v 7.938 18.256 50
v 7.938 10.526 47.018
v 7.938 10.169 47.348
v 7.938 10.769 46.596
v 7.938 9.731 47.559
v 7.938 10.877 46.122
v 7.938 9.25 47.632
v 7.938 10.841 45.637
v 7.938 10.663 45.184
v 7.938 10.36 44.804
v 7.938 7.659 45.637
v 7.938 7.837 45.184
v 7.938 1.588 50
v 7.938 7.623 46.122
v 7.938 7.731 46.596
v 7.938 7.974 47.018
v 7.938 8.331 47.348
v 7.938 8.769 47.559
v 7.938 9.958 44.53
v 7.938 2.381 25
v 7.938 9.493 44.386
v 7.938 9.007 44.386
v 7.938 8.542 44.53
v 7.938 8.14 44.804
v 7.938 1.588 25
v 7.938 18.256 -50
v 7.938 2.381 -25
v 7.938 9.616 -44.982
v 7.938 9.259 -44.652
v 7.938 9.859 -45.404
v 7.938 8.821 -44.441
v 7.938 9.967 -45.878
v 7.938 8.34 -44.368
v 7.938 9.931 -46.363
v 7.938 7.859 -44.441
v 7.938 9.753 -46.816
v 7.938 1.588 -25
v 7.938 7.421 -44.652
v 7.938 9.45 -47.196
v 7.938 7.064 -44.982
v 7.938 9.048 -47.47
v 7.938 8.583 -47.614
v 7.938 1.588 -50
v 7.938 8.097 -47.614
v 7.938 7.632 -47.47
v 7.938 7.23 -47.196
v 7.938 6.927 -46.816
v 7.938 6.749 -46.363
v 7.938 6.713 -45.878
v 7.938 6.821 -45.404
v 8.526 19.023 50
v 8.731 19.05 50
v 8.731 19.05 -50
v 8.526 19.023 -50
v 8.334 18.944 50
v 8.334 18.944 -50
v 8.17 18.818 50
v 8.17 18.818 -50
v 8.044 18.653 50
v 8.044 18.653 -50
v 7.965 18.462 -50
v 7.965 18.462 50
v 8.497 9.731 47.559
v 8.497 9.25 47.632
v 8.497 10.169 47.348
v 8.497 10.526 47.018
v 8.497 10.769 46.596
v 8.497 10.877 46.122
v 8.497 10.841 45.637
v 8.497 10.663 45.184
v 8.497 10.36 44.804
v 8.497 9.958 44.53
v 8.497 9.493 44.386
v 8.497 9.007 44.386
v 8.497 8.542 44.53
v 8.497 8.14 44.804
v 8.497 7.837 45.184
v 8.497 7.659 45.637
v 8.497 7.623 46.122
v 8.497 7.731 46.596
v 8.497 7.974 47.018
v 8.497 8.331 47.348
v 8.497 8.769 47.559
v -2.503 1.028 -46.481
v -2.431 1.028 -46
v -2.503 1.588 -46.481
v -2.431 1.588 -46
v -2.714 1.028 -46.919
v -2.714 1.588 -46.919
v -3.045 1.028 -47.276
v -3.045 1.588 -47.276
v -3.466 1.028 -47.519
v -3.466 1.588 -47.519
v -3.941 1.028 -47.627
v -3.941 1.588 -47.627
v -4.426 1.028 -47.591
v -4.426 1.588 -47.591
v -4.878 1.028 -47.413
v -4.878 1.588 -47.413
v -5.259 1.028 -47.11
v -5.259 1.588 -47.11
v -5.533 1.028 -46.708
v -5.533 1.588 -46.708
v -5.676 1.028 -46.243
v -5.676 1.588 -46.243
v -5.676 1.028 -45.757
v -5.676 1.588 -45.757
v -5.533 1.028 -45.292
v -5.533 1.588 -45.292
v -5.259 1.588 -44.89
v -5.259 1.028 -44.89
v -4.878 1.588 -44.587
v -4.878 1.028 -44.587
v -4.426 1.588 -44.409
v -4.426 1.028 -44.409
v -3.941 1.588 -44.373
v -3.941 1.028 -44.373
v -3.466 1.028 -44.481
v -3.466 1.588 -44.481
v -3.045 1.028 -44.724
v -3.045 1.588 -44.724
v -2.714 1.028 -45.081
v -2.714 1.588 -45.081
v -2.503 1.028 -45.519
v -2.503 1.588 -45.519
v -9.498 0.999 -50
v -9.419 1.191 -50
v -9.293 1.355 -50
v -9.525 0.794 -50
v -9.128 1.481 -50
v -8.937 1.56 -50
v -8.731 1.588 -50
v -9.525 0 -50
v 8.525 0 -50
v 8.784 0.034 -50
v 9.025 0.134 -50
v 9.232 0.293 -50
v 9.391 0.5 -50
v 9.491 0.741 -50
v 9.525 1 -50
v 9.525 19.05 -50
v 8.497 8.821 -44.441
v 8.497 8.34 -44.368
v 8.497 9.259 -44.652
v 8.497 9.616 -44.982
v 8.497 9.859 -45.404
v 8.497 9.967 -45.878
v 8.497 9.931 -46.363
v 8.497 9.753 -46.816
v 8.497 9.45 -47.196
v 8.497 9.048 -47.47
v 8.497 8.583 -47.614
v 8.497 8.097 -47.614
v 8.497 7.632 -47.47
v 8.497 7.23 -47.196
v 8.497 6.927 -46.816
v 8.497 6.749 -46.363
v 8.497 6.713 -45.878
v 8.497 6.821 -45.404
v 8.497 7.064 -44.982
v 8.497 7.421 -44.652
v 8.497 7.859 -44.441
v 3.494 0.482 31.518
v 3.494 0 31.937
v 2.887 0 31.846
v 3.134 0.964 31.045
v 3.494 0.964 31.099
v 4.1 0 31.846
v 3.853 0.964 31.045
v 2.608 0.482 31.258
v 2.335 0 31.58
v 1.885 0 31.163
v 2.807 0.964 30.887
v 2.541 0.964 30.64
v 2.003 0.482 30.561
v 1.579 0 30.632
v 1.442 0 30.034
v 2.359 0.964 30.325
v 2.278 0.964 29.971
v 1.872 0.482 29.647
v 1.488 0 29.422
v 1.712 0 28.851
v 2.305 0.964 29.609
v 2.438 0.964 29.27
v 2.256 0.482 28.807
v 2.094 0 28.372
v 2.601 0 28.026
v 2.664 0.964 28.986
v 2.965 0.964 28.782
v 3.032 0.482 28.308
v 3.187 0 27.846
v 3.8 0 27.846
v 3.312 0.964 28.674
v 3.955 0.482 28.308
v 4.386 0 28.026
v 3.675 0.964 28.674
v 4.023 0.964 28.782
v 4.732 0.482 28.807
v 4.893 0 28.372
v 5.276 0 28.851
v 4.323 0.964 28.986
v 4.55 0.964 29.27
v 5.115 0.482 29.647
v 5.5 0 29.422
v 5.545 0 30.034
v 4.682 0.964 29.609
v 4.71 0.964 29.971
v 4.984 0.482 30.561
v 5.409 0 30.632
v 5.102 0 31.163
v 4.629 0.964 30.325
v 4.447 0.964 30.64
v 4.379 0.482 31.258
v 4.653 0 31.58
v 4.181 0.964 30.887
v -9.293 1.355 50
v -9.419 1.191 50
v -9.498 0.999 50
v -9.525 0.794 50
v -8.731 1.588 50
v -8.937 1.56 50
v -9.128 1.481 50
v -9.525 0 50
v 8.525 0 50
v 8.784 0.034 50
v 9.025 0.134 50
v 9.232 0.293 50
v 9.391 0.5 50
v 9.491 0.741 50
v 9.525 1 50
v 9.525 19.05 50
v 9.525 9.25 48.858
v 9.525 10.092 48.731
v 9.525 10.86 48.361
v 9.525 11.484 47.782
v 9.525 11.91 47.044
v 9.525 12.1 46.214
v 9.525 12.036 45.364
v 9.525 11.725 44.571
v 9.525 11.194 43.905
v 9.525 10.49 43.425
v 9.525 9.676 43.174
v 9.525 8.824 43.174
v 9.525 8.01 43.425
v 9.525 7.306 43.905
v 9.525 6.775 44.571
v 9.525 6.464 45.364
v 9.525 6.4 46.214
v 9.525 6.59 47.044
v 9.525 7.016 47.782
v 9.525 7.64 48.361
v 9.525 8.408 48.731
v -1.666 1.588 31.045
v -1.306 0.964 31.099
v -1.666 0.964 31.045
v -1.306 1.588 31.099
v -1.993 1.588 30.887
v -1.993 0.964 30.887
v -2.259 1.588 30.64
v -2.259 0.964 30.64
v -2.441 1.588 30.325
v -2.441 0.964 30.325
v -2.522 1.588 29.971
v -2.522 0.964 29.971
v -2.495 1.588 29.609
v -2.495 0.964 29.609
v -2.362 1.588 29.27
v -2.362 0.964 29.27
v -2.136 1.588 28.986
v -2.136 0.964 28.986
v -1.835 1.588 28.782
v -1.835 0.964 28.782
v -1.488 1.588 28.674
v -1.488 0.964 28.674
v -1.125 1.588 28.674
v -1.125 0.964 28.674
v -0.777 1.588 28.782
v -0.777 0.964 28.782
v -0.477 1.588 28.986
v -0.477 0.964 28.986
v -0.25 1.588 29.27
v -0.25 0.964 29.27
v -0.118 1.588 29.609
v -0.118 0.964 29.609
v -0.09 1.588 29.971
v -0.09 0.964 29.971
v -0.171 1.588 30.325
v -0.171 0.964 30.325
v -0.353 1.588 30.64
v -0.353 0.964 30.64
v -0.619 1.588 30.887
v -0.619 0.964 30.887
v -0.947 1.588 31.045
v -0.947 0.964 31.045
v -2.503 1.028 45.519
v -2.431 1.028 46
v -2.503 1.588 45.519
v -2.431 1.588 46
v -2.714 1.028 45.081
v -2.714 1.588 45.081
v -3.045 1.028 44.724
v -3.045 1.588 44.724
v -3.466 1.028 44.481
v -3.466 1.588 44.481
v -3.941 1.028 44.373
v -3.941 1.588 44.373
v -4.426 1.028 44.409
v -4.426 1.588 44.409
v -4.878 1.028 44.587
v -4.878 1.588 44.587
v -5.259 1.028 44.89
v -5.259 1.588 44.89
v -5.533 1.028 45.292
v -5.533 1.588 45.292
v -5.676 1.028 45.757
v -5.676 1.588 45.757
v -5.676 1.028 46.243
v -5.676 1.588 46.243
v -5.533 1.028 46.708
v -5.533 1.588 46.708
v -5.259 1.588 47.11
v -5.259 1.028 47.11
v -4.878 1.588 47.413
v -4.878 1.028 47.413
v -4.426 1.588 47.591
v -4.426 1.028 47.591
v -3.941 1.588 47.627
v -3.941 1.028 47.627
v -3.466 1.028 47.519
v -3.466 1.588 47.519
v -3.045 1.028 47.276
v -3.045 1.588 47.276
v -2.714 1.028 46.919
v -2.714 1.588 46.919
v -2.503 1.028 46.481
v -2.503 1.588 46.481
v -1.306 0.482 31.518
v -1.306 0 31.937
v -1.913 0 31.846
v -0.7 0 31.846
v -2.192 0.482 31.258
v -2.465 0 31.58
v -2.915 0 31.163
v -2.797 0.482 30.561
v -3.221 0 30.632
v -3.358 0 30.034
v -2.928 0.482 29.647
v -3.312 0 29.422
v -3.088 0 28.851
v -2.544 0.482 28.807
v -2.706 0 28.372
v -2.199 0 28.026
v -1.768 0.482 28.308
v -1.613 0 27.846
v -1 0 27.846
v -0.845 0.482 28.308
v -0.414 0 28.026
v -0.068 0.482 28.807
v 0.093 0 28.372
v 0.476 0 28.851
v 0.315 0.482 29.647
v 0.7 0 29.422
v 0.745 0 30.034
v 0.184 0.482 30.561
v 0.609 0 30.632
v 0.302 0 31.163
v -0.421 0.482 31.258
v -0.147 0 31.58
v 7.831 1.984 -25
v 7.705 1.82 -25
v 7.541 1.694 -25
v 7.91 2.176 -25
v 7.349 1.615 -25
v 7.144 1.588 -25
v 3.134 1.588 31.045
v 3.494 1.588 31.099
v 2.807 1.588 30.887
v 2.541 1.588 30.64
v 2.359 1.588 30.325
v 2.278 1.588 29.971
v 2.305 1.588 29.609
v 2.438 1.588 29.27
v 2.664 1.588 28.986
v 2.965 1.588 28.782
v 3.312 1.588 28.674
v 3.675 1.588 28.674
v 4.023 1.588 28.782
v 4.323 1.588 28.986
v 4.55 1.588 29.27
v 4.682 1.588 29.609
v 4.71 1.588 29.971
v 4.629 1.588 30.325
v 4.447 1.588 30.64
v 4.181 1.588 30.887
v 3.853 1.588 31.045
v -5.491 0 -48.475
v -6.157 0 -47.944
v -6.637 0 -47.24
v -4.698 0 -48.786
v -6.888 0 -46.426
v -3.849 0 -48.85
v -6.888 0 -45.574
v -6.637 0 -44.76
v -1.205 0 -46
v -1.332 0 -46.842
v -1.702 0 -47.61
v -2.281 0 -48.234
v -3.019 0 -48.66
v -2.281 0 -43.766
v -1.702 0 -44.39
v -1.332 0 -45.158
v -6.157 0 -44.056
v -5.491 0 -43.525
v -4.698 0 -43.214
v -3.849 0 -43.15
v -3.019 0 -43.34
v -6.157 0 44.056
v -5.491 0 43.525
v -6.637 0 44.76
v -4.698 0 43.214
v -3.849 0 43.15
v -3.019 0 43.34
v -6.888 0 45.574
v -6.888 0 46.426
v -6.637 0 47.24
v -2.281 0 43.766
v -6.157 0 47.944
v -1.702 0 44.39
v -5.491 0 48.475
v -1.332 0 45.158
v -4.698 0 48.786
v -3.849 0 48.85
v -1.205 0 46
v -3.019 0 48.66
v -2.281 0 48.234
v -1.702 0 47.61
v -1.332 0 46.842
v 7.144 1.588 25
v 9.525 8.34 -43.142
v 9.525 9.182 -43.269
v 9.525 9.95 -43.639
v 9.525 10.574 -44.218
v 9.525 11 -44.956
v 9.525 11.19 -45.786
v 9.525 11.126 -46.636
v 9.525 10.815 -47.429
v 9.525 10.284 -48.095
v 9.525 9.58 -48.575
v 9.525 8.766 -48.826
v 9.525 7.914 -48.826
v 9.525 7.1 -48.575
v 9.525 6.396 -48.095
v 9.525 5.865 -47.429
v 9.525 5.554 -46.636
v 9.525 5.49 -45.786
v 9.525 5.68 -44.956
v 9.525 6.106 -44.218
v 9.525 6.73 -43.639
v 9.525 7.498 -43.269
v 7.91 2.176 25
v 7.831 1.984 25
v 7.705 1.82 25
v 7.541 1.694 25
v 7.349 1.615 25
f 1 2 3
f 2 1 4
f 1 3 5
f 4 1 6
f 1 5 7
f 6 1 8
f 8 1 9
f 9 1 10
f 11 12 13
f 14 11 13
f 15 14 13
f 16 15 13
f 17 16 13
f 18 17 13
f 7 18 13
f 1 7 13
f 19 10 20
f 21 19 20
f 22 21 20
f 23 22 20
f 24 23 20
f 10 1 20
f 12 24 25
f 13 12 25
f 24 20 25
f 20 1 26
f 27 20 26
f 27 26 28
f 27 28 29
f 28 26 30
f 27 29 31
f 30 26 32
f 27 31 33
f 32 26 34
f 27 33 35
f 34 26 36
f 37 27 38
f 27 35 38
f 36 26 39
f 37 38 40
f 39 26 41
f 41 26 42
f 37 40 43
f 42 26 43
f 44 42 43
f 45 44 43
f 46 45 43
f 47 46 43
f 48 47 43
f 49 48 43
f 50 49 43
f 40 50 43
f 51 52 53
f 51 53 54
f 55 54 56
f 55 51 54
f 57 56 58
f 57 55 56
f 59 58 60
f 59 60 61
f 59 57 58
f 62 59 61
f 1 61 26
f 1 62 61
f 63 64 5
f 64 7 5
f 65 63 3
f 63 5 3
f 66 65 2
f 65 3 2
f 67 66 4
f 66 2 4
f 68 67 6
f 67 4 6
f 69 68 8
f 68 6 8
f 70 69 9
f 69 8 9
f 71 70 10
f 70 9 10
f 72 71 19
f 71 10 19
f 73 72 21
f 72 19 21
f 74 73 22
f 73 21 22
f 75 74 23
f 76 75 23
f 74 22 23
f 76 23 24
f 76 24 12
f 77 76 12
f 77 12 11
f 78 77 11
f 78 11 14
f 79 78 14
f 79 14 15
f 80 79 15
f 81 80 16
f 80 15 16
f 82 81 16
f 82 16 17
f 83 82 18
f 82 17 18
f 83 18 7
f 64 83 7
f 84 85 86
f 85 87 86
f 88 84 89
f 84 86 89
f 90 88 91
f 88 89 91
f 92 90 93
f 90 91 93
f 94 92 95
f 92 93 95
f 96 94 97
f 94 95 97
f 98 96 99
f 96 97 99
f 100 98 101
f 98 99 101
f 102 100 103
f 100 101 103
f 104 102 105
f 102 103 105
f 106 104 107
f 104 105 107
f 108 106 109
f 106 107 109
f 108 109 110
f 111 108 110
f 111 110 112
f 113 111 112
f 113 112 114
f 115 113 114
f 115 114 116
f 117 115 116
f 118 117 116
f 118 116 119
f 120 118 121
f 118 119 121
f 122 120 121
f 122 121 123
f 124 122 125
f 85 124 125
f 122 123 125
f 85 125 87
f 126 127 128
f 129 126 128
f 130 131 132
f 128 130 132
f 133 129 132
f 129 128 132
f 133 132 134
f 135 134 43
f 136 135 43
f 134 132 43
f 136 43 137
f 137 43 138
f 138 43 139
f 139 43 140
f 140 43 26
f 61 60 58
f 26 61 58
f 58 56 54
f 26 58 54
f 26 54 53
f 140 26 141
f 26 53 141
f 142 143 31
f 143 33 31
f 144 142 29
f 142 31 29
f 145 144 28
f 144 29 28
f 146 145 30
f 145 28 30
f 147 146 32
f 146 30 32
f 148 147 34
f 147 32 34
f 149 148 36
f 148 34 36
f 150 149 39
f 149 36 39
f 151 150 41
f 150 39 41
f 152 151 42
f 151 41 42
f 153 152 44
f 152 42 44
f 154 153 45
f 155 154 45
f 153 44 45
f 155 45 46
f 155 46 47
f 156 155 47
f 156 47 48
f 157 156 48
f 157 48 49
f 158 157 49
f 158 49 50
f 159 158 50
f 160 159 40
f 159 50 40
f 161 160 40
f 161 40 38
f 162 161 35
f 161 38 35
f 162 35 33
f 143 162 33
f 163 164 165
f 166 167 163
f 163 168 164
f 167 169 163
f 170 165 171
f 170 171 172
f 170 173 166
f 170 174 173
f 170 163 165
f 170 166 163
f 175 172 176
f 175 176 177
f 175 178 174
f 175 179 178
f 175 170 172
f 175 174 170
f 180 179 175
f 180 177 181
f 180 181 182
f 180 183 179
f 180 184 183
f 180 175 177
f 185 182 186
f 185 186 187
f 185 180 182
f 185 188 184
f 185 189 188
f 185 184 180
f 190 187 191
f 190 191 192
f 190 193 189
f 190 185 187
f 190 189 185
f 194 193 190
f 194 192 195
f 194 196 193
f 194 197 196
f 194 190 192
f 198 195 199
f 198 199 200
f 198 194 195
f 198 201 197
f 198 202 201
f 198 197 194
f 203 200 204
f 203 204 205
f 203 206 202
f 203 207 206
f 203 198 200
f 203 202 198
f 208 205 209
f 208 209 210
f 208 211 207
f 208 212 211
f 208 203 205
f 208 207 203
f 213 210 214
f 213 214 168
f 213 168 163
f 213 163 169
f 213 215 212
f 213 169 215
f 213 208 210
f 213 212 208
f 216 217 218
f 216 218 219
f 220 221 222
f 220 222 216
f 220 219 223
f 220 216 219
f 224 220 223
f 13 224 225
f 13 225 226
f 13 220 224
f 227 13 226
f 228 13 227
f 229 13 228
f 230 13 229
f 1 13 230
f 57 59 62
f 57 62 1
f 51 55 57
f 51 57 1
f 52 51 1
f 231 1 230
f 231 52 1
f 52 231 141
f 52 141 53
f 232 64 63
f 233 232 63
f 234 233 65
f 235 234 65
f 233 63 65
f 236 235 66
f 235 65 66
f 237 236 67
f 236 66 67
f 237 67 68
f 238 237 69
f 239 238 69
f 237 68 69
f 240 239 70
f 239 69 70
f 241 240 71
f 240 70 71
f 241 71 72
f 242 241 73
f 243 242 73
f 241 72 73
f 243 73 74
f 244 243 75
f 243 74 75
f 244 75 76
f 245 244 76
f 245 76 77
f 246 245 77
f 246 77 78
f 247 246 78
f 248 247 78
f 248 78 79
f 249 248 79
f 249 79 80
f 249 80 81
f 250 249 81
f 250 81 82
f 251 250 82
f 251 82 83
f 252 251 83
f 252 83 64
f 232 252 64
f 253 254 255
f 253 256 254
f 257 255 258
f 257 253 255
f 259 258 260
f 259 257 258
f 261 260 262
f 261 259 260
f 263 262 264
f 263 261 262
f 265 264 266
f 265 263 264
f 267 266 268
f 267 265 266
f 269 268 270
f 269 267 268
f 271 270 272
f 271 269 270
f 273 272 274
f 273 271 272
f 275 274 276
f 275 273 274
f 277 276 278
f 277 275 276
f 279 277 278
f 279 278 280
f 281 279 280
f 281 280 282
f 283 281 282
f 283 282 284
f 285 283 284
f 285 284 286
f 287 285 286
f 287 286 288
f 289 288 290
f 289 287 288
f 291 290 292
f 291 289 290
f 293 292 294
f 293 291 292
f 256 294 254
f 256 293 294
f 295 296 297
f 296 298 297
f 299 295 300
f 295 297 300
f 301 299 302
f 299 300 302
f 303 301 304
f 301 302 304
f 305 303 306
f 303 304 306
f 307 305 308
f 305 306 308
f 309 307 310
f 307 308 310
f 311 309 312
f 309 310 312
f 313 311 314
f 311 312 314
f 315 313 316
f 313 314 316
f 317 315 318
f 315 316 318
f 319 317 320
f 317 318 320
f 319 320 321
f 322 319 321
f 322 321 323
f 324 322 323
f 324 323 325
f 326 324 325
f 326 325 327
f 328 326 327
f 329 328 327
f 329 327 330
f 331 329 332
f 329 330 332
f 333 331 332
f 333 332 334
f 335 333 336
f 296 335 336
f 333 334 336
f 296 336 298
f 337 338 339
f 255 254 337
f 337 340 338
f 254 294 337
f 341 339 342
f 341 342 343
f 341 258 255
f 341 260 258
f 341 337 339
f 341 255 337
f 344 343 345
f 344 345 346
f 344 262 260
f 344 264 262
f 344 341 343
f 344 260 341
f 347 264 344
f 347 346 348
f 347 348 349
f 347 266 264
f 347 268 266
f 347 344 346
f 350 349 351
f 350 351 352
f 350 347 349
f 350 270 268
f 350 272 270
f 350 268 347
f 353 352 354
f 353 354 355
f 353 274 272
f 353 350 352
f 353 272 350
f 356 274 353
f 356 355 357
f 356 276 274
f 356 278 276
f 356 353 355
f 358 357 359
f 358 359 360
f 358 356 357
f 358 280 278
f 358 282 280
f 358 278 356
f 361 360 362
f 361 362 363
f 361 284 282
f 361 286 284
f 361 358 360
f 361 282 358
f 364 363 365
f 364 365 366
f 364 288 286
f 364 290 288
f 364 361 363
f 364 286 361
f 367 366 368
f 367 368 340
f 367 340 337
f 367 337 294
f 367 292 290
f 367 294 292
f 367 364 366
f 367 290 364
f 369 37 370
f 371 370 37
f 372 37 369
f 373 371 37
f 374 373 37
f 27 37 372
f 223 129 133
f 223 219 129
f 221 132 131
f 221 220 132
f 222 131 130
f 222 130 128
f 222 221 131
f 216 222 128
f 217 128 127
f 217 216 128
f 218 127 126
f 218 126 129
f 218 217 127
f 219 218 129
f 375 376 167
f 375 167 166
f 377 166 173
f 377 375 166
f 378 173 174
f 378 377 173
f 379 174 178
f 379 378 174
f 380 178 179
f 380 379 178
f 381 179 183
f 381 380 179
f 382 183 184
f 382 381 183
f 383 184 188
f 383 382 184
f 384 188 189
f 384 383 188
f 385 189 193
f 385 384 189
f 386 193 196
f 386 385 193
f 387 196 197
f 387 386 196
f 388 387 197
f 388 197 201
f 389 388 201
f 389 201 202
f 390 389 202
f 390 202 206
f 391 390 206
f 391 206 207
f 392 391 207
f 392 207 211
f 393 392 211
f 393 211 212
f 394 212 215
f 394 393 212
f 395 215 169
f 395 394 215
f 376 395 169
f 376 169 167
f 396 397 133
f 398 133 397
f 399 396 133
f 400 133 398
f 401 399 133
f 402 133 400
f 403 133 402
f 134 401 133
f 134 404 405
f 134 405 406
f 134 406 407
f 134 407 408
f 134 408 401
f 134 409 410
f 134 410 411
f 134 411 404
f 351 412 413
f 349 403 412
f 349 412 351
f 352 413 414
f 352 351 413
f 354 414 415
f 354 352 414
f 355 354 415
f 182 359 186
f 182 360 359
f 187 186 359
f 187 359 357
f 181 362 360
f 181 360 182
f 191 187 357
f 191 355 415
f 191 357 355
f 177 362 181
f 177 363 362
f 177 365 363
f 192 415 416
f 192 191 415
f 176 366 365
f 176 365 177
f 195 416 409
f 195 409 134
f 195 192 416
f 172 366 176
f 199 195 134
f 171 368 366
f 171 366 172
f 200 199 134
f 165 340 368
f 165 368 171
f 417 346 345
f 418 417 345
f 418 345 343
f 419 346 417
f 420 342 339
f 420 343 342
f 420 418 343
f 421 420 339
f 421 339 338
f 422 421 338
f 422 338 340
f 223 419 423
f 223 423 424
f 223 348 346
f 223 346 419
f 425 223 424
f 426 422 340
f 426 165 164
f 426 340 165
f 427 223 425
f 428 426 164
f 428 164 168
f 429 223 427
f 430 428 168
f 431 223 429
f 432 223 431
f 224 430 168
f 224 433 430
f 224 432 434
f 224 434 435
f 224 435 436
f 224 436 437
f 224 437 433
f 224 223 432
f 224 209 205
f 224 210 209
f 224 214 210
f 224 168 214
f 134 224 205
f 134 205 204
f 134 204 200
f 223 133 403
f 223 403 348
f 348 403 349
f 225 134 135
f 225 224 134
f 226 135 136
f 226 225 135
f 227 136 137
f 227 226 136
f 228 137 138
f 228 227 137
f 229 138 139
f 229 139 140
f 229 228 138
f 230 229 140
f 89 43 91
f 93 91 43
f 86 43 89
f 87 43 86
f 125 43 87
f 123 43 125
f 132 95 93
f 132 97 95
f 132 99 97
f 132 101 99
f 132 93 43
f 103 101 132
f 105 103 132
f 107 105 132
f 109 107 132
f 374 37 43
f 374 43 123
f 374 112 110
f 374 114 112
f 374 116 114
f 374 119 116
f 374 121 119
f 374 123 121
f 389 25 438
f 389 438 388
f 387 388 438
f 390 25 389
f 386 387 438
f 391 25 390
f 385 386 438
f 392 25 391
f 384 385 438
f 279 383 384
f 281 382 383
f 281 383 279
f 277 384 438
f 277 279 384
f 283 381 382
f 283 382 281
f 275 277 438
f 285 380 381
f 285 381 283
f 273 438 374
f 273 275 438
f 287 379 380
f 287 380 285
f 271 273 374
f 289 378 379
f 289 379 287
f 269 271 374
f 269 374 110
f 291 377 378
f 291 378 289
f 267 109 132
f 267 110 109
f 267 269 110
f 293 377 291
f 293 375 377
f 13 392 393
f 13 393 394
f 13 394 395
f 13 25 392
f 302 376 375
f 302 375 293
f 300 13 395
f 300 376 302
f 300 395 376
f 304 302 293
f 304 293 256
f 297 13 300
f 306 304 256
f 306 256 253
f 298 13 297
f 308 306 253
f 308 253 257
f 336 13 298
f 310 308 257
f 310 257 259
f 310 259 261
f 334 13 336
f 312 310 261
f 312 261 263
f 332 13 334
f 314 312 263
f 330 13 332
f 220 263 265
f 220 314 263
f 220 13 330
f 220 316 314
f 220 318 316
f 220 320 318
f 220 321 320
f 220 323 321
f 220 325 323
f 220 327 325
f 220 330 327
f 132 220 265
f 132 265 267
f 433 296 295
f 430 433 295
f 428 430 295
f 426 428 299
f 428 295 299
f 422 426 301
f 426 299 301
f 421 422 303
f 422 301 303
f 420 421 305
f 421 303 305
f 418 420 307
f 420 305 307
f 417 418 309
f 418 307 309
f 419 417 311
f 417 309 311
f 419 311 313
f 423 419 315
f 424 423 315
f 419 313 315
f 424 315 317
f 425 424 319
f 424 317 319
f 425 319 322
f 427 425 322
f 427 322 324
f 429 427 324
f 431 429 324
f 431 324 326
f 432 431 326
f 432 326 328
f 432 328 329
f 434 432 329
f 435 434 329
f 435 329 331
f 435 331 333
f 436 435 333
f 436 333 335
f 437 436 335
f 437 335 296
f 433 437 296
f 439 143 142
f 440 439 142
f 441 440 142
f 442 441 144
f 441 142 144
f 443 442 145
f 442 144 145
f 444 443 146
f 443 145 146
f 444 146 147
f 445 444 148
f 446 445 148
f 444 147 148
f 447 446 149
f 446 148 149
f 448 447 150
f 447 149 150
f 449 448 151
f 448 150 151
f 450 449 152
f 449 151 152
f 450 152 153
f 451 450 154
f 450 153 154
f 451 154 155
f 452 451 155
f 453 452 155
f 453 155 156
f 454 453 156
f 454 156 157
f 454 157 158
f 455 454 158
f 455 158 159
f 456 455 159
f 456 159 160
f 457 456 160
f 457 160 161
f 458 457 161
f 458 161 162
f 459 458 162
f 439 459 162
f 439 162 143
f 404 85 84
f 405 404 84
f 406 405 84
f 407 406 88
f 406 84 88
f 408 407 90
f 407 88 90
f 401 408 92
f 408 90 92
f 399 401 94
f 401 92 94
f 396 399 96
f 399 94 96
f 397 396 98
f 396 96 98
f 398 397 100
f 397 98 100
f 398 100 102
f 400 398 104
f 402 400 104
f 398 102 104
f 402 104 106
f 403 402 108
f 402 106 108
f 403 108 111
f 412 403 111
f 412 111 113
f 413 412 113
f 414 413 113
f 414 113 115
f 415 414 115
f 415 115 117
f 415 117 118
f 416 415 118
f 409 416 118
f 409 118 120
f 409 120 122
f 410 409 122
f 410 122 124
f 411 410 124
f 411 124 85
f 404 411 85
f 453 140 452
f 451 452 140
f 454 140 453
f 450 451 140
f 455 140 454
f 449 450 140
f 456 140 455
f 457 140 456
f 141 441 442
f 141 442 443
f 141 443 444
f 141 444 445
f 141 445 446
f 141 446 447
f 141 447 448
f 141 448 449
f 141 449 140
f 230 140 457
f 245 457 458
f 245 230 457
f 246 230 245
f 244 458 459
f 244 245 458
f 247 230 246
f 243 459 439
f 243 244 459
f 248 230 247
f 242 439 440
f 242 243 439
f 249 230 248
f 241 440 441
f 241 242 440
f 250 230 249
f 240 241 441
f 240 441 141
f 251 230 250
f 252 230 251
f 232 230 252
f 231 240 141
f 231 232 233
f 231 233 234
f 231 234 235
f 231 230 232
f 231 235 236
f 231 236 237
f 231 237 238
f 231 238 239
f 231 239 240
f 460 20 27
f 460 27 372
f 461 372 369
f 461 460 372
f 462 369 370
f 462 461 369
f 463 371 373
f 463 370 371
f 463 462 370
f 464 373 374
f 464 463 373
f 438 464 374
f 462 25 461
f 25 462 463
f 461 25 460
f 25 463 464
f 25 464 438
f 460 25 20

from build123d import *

# Parameters (mm, degrees)
BOSS_EXTRUDE1_DEPTH                               = 50
CSK_FOR_4_FLAT_HEAD_MACHINE_SCREW_100_D           = 3.2639
CSK_FOR_4_FLAT_HEAD_MACHINE_SCREW_100_CSINK_D     = 5.715
CSK_FOR_4_FLAT_HEAD_MACHINE_SCREW_100_CSINK_ANGLE = 100
CSK_FOR_4_FLAT_HEAD_MACHINE_SCREW_2_D             = 3.2639
CSK_FOR_4_FLAT_HEAD_MACHINE_SCREW_2_CSINK_D       = 5.715
CSK_FOR_4_FLAT_HEAD_MACHINE_SCREW_2_CSINK_ANGLE   = 100
FILLET1_R                                         = 1
F_2_CLEARANCE_HOLE1_AT_2_COUNT                    = 2
F_2_CLEARANCE_HOLE1_AT_2_PITCH                    = 4.8
CUT_EXTRUDE1_DEPTH                                = 25


with BuildPart() as part:
    # Sketch2 → Boss-Extrude1 (new, symmetric)
    with BuildSketch(Plane.XY):
        with BuildLine():
            Line((-9.525, 0), (9.525, 0))
            Line((9.525, 0), (9.525, 19.05))
            Line((9.525, 19.05), (8.73125, 19.05))
            ThreePointArc((8.73125, 19.05), (8.169983992, 18.817516008), (7.9375, 18.25625))
            Line((7.9375, 18.25625), (7.9375, 2.38125))
            ThreePointArc((7.9375, 2.38125), (7.705016008, 1.819983992), (7.14375, 1.5875))
            Line((7.14375, 1.5875), (-8.73125, 1.5875))
            ThreePointArc((-8.73125, 1.5875), (-9.292516008, 1.355016008), (-9.525, 0.79375))
            Line((-9.525, 0.79375), (-9.525, 0))
        make_face()
    extrude(amount=BOSS_EXTRUDE1_DEPTH, both=True)

    # CSK for _4 Flat Head Machine Screw _100 (through all)
    with Locations(Plane(origin=(0, 0, 0), x_dir=(-1, 0, 0), z_dir=(0, -1, 0))):
        with Locations((4.0625, -46), (4.0625, 46)):
            CounterSinkHole(CSK_FOR_4_FLAT_HEAD_MACHINE_SCREW_100_D / 2, CSK_FOR_4_FLAT_HEAD_MACHINE_SCREW_100_CSINK_D / 2, counter_sink_angle=CSK_FOR_4_FLAT_HEAD_MACHINE_SCREW_100_CSINK_ANGLE)

    # CSK for _4 Flat Head Machine Screw _ 2 (through all)
    with Locations(Plane(origin=(9.525, 0, 0), x_dir=(0, 0, -1), z_dir=(1, 0, 0))):
        with Locations((-46, 9.25), (46, 8.34)):
            CounterSinkHole(CSK_FOR_4_FLAT_HEAD_MACHINE_SCREW_2_D / 2, CSK_FOR_4_FLAT_HEAD_MACHINE_SCREW_2_CSINK_D / 2, counter_sink_angle=CSK_FOR_4_FLAT_HEAD_MACHINE_SCREW_2_CSINK_ANGLE)

    # Fillet1
    fillet1_edges = [part.edges().sort_by_distance(p)[0] for p in [
        (9.525, 0, 0),
    ]]
    fillet(fillet1_edges, radius=FILLET1_R)

    # Sketch30 → #2 Clearance Hole1 (revolve, cut)
    with BuildSketch(Plane(origin=(3.49375, 1.5875, 29.88), x_dir=(0, 0, 1), z_dir=(1, 0, 0))):
        Polygon((0, 0), (0, 1.5875), (2.0574, 1.5875), (1.2192, 0.623261201), (1.2192, 0), align=None)
    f_2_clearance_hole1 = revolve(axis=Axis((3.49375, 7.9375, 29.88), (0, -1, 0)), mode=Mode.SUBTRACT)

    # #2 Clearance Hole1 at 2: #2 Clearance Hole1 ×2
    with Locations(*[(-i * F_2_CLEARANCE_HOLE1_AT_2_PITCH, 0, 0) for i in range(1, F_2_CLEARANCE_HOLE1_AT_2_COUNT)]):
        add(f_2_clearance_hole1, mode=Mode.SUBTRACT)

    # Sketch43 → Cut-Extrude1 (cut)
    with BuildSketch(Plane(origin=(0, 0, -50), x_dir=(-1, 0, 0), z_dir=(0, 0, -1))):
        Polygon((-7.9375, 6.5875), (-7.9375, 1.5875), (-2.9375, 1.5875), align=None)
    cut_extrude1 = extrude(amount=-CUT_EXTRUDE1_DEPTH, mode=Mode.SUBTRACT)

    # Mirror1: Cut-Extrude1 across plane
    add(cut_extrude1.mirror(Plane(origin=(0, 0, 0), x_dir=(1, 0, 0), z_dir=(0, 0, -1))), mode=Mode.SUBTRACT)


solid = part.part
